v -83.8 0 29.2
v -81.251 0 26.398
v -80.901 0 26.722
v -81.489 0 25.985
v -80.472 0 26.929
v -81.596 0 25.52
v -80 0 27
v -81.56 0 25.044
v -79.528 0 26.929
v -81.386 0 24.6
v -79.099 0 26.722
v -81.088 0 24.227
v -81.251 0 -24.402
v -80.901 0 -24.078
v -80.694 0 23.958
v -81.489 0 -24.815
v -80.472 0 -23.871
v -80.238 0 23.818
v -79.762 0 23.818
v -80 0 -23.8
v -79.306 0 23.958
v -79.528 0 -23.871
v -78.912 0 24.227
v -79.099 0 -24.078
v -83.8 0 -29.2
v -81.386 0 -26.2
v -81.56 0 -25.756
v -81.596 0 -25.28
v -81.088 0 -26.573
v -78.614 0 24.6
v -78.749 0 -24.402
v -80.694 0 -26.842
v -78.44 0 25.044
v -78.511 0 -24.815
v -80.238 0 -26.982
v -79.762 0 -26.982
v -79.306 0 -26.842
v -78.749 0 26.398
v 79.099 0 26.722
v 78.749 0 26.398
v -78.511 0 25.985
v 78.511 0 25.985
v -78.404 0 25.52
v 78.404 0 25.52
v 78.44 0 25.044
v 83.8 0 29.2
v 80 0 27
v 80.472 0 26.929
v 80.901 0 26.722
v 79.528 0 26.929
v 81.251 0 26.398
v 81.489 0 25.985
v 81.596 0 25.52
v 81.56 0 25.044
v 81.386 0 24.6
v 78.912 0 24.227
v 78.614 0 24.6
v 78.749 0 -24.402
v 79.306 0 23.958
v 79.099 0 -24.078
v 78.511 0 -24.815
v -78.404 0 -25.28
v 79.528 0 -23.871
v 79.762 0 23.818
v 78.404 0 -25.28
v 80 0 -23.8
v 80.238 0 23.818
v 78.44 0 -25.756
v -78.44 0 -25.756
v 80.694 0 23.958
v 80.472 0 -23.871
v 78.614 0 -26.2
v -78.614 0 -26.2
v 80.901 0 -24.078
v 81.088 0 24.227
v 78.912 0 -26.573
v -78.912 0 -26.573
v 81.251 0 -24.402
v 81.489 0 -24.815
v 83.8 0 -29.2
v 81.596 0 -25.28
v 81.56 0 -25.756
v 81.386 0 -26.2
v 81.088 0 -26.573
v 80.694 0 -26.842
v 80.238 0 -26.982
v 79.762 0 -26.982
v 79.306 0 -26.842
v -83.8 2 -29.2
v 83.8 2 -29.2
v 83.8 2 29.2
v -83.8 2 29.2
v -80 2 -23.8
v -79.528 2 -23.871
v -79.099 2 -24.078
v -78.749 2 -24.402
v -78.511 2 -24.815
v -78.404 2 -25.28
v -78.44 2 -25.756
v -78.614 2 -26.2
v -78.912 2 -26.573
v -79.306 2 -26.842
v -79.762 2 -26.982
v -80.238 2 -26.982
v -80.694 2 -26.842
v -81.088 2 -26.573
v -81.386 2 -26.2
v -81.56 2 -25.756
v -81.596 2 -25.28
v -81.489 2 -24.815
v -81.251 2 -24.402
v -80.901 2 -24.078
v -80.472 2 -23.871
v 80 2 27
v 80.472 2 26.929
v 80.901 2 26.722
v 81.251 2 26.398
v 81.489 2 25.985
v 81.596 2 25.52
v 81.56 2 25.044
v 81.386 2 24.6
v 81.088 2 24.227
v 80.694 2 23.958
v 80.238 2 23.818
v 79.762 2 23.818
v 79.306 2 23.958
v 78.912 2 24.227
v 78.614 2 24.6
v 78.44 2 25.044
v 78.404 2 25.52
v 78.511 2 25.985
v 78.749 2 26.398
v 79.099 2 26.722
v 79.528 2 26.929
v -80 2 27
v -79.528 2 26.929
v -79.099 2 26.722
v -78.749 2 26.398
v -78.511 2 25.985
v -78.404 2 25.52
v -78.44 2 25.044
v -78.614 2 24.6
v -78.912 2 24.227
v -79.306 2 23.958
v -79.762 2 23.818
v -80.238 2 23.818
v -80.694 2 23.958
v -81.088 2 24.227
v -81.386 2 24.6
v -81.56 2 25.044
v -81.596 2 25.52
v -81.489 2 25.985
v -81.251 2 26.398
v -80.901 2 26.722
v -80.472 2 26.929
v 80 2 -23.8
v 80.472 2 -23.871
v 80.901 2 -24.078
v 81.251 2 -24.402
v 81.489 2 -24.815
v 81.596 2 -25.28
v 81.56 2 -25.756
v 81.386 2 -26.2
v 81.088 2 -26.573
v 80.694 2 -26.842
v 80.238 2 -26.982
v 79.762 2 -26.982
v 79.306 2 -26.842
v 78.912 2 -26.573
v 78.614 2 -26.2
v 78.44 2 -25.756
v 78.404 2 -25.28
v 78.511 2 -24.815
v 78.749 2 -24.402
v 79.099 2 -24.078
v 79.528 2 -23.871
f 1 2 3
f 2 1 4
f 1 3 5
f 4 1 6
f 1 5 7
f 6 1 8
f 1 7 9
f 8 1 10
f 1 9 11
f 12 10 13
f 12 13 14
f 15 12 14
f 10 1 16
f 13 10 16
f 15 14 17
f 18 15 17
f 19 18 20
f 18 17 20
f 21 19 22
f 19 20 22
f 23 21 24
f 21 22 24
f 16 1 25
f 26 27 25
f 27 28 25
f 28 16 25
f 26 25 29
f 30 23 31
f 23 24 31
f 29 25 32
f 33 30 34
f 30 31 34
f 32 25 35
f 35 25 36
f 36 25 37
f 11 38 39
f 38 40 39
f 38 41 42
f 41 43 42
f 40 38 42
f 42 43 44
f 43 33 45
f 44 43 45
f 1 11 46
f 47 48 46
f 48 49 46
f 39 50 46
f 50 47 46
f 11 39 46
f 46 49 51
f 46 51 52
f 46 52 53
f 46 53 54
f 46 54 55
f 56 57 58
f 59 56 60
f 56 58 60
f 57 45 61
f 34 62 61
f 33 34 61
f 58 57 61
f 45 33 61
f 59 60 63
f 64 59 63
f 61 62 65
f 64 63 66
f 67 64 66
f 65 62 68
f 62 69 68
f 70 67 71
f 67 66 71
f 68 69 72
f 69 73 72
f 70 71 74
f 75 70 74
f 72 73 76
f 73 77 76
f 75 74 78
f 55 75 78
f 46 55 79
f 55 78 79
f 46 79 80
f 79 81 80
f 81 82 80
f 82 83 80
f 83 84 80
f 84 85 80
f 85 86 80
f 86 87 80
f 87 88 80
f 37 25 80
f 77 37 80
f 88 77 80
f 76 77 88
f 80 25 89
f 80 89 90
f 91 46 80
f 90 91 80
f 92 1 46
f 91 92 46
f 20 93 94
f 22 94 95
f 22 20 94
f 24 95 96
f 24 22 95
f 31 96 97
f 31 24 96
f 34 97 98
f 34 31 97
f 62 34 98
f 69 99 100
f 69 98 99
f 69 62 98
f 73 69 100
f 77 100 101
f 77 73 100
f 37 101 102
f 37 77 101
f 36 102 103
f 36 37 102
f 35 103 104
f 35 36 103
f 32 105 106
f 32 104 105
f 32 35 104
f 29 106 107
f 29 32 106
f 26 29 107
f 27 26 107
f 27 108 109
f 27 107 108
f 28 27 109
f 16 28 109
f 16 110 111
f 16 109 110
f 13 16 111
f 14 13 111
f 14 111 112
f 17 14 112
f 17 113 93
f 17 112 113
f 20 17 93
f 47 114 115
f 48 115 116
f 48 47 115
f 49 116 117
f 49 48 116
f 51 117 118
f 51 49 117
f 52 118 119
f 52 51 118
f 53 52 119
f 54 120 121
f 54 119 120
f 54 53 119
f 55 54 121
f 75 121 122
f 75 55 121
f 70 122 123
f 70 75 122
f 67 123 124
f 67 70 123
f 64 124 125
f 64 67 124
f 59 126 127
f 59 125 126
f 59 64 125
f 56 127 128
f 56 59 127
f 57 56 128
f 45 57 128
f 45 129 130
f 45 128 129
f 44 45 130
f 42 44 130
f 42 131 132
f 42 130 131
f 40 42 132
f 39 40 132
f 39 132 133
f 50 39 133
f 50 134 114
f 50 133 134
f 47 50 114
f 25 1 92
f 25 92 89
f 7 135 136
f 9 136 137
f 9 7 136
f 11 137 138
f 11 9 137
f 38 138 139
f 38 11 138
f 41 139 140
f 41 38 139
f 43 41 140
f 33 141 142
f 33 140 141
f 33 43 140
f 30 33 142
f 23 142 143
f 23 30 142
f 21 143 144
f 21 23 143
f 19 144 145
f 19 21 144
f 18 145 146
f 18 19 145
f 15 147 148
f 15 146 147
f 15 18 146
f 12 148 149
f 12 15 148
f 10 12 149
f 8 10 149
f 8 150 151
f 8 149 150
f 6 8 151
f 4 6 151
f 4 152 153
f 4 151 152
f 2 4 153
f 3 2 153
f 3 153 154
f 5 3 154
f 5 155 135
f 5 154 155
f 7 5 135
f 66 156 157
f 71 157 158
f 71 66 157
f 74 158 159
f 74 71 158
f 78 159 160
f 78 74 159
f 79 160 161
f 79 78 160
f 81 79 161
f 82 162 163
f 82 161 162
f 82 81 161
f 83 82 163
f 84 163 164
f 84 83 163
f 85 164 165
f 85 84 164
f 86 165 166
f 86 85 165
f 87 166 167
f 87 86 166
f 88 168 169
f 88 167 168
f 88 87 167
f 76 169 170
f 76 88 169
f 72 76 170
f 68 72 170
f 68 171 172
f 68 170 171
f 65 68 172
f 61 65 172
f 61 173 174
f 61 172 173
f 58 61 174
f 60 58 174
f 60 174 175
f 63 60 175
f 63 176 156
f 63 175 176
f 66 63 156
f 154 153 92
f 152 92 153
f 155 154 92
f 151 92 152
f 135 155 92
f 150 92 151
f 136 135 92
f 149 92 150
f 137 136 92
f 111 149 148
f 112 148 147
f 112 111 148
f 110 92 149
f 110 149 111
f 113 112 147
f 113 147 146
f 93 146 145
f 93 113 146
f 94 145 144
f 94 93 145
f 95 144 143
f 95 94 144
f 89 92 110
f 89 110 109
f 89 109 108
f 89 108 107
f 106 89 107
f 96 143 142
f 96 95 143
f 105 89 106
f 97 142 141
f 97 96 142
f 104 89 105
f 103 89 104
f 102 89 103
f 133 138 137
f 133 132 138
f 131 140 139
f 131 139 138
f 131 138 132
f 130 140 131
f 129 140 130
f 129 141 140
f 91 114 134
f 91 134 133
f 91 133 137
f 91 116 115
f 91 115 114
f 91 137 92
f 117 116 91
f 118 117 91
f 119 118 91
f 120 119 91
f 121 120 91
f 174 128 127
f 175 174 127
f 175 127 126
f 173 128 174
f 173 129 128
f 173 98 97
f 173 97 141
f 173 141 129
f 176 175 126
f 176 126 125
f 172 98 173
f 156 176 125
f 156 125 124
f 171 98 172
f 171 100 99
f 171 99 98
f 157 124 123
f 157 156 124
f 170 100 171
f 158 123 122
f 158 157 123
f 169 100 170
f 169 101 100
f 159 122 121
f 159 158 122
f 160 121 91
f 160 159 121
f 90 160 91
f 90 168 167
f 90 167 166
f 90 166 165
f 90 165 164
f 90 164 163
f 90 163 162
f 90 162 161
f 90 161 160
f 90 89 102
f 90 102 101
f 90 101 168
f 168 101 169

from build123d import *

# Parameters (mm, degrees)
SKETCH1_W           = 167.6
SKETCH1_H           = 58.4
BOSS_EXTRUDE1_DEPTH = 2
SKETCH2_R           = 1.6
CUT_EXTRUDE1_DEPTH  = 89.764181965


with BuildPart() as part:
    # Sketch1 → Boss-Extrude1 (new body)
    with BuildSketch(Plane(origin=(0, 0, 0), x_dir=(1, 0, 0), z_dir=(0, 1, 0))):
        Rectangle(SKETCH1_W, SKETCH1_H)
    extrude(amount=BOSS_EXTRUDE1_DEPTH)

    # Sketch2 → Cut-Extrude1 (cut, through all)
    with BuildSketch(Plane(origin=(0, 0, 0), x_dir=(1, 0, 0), z_dir=(0, 1, 0))):
        with Locations(Location((-80, 25.4, 0), (0, 0, 270))):
            Circle(SKETCH2_R)
        with Locations(Location((-80, -25.4, 0), (0, 0, 270))):
            Circle(SKETCH2_R)
        with Locations(Location((80, 25.4, 0), (0, 0, 270))):
            Circle(SKETCH2_R)
        with Locations(Location((80, -25.4, 0), (0, 0, 270))):
            Circle(SKETCH2_R)
    extrude(amount=CUT_EXTRUDE1_DEPTH, mode=Mode.SUBTRACT)


solid = part.part
